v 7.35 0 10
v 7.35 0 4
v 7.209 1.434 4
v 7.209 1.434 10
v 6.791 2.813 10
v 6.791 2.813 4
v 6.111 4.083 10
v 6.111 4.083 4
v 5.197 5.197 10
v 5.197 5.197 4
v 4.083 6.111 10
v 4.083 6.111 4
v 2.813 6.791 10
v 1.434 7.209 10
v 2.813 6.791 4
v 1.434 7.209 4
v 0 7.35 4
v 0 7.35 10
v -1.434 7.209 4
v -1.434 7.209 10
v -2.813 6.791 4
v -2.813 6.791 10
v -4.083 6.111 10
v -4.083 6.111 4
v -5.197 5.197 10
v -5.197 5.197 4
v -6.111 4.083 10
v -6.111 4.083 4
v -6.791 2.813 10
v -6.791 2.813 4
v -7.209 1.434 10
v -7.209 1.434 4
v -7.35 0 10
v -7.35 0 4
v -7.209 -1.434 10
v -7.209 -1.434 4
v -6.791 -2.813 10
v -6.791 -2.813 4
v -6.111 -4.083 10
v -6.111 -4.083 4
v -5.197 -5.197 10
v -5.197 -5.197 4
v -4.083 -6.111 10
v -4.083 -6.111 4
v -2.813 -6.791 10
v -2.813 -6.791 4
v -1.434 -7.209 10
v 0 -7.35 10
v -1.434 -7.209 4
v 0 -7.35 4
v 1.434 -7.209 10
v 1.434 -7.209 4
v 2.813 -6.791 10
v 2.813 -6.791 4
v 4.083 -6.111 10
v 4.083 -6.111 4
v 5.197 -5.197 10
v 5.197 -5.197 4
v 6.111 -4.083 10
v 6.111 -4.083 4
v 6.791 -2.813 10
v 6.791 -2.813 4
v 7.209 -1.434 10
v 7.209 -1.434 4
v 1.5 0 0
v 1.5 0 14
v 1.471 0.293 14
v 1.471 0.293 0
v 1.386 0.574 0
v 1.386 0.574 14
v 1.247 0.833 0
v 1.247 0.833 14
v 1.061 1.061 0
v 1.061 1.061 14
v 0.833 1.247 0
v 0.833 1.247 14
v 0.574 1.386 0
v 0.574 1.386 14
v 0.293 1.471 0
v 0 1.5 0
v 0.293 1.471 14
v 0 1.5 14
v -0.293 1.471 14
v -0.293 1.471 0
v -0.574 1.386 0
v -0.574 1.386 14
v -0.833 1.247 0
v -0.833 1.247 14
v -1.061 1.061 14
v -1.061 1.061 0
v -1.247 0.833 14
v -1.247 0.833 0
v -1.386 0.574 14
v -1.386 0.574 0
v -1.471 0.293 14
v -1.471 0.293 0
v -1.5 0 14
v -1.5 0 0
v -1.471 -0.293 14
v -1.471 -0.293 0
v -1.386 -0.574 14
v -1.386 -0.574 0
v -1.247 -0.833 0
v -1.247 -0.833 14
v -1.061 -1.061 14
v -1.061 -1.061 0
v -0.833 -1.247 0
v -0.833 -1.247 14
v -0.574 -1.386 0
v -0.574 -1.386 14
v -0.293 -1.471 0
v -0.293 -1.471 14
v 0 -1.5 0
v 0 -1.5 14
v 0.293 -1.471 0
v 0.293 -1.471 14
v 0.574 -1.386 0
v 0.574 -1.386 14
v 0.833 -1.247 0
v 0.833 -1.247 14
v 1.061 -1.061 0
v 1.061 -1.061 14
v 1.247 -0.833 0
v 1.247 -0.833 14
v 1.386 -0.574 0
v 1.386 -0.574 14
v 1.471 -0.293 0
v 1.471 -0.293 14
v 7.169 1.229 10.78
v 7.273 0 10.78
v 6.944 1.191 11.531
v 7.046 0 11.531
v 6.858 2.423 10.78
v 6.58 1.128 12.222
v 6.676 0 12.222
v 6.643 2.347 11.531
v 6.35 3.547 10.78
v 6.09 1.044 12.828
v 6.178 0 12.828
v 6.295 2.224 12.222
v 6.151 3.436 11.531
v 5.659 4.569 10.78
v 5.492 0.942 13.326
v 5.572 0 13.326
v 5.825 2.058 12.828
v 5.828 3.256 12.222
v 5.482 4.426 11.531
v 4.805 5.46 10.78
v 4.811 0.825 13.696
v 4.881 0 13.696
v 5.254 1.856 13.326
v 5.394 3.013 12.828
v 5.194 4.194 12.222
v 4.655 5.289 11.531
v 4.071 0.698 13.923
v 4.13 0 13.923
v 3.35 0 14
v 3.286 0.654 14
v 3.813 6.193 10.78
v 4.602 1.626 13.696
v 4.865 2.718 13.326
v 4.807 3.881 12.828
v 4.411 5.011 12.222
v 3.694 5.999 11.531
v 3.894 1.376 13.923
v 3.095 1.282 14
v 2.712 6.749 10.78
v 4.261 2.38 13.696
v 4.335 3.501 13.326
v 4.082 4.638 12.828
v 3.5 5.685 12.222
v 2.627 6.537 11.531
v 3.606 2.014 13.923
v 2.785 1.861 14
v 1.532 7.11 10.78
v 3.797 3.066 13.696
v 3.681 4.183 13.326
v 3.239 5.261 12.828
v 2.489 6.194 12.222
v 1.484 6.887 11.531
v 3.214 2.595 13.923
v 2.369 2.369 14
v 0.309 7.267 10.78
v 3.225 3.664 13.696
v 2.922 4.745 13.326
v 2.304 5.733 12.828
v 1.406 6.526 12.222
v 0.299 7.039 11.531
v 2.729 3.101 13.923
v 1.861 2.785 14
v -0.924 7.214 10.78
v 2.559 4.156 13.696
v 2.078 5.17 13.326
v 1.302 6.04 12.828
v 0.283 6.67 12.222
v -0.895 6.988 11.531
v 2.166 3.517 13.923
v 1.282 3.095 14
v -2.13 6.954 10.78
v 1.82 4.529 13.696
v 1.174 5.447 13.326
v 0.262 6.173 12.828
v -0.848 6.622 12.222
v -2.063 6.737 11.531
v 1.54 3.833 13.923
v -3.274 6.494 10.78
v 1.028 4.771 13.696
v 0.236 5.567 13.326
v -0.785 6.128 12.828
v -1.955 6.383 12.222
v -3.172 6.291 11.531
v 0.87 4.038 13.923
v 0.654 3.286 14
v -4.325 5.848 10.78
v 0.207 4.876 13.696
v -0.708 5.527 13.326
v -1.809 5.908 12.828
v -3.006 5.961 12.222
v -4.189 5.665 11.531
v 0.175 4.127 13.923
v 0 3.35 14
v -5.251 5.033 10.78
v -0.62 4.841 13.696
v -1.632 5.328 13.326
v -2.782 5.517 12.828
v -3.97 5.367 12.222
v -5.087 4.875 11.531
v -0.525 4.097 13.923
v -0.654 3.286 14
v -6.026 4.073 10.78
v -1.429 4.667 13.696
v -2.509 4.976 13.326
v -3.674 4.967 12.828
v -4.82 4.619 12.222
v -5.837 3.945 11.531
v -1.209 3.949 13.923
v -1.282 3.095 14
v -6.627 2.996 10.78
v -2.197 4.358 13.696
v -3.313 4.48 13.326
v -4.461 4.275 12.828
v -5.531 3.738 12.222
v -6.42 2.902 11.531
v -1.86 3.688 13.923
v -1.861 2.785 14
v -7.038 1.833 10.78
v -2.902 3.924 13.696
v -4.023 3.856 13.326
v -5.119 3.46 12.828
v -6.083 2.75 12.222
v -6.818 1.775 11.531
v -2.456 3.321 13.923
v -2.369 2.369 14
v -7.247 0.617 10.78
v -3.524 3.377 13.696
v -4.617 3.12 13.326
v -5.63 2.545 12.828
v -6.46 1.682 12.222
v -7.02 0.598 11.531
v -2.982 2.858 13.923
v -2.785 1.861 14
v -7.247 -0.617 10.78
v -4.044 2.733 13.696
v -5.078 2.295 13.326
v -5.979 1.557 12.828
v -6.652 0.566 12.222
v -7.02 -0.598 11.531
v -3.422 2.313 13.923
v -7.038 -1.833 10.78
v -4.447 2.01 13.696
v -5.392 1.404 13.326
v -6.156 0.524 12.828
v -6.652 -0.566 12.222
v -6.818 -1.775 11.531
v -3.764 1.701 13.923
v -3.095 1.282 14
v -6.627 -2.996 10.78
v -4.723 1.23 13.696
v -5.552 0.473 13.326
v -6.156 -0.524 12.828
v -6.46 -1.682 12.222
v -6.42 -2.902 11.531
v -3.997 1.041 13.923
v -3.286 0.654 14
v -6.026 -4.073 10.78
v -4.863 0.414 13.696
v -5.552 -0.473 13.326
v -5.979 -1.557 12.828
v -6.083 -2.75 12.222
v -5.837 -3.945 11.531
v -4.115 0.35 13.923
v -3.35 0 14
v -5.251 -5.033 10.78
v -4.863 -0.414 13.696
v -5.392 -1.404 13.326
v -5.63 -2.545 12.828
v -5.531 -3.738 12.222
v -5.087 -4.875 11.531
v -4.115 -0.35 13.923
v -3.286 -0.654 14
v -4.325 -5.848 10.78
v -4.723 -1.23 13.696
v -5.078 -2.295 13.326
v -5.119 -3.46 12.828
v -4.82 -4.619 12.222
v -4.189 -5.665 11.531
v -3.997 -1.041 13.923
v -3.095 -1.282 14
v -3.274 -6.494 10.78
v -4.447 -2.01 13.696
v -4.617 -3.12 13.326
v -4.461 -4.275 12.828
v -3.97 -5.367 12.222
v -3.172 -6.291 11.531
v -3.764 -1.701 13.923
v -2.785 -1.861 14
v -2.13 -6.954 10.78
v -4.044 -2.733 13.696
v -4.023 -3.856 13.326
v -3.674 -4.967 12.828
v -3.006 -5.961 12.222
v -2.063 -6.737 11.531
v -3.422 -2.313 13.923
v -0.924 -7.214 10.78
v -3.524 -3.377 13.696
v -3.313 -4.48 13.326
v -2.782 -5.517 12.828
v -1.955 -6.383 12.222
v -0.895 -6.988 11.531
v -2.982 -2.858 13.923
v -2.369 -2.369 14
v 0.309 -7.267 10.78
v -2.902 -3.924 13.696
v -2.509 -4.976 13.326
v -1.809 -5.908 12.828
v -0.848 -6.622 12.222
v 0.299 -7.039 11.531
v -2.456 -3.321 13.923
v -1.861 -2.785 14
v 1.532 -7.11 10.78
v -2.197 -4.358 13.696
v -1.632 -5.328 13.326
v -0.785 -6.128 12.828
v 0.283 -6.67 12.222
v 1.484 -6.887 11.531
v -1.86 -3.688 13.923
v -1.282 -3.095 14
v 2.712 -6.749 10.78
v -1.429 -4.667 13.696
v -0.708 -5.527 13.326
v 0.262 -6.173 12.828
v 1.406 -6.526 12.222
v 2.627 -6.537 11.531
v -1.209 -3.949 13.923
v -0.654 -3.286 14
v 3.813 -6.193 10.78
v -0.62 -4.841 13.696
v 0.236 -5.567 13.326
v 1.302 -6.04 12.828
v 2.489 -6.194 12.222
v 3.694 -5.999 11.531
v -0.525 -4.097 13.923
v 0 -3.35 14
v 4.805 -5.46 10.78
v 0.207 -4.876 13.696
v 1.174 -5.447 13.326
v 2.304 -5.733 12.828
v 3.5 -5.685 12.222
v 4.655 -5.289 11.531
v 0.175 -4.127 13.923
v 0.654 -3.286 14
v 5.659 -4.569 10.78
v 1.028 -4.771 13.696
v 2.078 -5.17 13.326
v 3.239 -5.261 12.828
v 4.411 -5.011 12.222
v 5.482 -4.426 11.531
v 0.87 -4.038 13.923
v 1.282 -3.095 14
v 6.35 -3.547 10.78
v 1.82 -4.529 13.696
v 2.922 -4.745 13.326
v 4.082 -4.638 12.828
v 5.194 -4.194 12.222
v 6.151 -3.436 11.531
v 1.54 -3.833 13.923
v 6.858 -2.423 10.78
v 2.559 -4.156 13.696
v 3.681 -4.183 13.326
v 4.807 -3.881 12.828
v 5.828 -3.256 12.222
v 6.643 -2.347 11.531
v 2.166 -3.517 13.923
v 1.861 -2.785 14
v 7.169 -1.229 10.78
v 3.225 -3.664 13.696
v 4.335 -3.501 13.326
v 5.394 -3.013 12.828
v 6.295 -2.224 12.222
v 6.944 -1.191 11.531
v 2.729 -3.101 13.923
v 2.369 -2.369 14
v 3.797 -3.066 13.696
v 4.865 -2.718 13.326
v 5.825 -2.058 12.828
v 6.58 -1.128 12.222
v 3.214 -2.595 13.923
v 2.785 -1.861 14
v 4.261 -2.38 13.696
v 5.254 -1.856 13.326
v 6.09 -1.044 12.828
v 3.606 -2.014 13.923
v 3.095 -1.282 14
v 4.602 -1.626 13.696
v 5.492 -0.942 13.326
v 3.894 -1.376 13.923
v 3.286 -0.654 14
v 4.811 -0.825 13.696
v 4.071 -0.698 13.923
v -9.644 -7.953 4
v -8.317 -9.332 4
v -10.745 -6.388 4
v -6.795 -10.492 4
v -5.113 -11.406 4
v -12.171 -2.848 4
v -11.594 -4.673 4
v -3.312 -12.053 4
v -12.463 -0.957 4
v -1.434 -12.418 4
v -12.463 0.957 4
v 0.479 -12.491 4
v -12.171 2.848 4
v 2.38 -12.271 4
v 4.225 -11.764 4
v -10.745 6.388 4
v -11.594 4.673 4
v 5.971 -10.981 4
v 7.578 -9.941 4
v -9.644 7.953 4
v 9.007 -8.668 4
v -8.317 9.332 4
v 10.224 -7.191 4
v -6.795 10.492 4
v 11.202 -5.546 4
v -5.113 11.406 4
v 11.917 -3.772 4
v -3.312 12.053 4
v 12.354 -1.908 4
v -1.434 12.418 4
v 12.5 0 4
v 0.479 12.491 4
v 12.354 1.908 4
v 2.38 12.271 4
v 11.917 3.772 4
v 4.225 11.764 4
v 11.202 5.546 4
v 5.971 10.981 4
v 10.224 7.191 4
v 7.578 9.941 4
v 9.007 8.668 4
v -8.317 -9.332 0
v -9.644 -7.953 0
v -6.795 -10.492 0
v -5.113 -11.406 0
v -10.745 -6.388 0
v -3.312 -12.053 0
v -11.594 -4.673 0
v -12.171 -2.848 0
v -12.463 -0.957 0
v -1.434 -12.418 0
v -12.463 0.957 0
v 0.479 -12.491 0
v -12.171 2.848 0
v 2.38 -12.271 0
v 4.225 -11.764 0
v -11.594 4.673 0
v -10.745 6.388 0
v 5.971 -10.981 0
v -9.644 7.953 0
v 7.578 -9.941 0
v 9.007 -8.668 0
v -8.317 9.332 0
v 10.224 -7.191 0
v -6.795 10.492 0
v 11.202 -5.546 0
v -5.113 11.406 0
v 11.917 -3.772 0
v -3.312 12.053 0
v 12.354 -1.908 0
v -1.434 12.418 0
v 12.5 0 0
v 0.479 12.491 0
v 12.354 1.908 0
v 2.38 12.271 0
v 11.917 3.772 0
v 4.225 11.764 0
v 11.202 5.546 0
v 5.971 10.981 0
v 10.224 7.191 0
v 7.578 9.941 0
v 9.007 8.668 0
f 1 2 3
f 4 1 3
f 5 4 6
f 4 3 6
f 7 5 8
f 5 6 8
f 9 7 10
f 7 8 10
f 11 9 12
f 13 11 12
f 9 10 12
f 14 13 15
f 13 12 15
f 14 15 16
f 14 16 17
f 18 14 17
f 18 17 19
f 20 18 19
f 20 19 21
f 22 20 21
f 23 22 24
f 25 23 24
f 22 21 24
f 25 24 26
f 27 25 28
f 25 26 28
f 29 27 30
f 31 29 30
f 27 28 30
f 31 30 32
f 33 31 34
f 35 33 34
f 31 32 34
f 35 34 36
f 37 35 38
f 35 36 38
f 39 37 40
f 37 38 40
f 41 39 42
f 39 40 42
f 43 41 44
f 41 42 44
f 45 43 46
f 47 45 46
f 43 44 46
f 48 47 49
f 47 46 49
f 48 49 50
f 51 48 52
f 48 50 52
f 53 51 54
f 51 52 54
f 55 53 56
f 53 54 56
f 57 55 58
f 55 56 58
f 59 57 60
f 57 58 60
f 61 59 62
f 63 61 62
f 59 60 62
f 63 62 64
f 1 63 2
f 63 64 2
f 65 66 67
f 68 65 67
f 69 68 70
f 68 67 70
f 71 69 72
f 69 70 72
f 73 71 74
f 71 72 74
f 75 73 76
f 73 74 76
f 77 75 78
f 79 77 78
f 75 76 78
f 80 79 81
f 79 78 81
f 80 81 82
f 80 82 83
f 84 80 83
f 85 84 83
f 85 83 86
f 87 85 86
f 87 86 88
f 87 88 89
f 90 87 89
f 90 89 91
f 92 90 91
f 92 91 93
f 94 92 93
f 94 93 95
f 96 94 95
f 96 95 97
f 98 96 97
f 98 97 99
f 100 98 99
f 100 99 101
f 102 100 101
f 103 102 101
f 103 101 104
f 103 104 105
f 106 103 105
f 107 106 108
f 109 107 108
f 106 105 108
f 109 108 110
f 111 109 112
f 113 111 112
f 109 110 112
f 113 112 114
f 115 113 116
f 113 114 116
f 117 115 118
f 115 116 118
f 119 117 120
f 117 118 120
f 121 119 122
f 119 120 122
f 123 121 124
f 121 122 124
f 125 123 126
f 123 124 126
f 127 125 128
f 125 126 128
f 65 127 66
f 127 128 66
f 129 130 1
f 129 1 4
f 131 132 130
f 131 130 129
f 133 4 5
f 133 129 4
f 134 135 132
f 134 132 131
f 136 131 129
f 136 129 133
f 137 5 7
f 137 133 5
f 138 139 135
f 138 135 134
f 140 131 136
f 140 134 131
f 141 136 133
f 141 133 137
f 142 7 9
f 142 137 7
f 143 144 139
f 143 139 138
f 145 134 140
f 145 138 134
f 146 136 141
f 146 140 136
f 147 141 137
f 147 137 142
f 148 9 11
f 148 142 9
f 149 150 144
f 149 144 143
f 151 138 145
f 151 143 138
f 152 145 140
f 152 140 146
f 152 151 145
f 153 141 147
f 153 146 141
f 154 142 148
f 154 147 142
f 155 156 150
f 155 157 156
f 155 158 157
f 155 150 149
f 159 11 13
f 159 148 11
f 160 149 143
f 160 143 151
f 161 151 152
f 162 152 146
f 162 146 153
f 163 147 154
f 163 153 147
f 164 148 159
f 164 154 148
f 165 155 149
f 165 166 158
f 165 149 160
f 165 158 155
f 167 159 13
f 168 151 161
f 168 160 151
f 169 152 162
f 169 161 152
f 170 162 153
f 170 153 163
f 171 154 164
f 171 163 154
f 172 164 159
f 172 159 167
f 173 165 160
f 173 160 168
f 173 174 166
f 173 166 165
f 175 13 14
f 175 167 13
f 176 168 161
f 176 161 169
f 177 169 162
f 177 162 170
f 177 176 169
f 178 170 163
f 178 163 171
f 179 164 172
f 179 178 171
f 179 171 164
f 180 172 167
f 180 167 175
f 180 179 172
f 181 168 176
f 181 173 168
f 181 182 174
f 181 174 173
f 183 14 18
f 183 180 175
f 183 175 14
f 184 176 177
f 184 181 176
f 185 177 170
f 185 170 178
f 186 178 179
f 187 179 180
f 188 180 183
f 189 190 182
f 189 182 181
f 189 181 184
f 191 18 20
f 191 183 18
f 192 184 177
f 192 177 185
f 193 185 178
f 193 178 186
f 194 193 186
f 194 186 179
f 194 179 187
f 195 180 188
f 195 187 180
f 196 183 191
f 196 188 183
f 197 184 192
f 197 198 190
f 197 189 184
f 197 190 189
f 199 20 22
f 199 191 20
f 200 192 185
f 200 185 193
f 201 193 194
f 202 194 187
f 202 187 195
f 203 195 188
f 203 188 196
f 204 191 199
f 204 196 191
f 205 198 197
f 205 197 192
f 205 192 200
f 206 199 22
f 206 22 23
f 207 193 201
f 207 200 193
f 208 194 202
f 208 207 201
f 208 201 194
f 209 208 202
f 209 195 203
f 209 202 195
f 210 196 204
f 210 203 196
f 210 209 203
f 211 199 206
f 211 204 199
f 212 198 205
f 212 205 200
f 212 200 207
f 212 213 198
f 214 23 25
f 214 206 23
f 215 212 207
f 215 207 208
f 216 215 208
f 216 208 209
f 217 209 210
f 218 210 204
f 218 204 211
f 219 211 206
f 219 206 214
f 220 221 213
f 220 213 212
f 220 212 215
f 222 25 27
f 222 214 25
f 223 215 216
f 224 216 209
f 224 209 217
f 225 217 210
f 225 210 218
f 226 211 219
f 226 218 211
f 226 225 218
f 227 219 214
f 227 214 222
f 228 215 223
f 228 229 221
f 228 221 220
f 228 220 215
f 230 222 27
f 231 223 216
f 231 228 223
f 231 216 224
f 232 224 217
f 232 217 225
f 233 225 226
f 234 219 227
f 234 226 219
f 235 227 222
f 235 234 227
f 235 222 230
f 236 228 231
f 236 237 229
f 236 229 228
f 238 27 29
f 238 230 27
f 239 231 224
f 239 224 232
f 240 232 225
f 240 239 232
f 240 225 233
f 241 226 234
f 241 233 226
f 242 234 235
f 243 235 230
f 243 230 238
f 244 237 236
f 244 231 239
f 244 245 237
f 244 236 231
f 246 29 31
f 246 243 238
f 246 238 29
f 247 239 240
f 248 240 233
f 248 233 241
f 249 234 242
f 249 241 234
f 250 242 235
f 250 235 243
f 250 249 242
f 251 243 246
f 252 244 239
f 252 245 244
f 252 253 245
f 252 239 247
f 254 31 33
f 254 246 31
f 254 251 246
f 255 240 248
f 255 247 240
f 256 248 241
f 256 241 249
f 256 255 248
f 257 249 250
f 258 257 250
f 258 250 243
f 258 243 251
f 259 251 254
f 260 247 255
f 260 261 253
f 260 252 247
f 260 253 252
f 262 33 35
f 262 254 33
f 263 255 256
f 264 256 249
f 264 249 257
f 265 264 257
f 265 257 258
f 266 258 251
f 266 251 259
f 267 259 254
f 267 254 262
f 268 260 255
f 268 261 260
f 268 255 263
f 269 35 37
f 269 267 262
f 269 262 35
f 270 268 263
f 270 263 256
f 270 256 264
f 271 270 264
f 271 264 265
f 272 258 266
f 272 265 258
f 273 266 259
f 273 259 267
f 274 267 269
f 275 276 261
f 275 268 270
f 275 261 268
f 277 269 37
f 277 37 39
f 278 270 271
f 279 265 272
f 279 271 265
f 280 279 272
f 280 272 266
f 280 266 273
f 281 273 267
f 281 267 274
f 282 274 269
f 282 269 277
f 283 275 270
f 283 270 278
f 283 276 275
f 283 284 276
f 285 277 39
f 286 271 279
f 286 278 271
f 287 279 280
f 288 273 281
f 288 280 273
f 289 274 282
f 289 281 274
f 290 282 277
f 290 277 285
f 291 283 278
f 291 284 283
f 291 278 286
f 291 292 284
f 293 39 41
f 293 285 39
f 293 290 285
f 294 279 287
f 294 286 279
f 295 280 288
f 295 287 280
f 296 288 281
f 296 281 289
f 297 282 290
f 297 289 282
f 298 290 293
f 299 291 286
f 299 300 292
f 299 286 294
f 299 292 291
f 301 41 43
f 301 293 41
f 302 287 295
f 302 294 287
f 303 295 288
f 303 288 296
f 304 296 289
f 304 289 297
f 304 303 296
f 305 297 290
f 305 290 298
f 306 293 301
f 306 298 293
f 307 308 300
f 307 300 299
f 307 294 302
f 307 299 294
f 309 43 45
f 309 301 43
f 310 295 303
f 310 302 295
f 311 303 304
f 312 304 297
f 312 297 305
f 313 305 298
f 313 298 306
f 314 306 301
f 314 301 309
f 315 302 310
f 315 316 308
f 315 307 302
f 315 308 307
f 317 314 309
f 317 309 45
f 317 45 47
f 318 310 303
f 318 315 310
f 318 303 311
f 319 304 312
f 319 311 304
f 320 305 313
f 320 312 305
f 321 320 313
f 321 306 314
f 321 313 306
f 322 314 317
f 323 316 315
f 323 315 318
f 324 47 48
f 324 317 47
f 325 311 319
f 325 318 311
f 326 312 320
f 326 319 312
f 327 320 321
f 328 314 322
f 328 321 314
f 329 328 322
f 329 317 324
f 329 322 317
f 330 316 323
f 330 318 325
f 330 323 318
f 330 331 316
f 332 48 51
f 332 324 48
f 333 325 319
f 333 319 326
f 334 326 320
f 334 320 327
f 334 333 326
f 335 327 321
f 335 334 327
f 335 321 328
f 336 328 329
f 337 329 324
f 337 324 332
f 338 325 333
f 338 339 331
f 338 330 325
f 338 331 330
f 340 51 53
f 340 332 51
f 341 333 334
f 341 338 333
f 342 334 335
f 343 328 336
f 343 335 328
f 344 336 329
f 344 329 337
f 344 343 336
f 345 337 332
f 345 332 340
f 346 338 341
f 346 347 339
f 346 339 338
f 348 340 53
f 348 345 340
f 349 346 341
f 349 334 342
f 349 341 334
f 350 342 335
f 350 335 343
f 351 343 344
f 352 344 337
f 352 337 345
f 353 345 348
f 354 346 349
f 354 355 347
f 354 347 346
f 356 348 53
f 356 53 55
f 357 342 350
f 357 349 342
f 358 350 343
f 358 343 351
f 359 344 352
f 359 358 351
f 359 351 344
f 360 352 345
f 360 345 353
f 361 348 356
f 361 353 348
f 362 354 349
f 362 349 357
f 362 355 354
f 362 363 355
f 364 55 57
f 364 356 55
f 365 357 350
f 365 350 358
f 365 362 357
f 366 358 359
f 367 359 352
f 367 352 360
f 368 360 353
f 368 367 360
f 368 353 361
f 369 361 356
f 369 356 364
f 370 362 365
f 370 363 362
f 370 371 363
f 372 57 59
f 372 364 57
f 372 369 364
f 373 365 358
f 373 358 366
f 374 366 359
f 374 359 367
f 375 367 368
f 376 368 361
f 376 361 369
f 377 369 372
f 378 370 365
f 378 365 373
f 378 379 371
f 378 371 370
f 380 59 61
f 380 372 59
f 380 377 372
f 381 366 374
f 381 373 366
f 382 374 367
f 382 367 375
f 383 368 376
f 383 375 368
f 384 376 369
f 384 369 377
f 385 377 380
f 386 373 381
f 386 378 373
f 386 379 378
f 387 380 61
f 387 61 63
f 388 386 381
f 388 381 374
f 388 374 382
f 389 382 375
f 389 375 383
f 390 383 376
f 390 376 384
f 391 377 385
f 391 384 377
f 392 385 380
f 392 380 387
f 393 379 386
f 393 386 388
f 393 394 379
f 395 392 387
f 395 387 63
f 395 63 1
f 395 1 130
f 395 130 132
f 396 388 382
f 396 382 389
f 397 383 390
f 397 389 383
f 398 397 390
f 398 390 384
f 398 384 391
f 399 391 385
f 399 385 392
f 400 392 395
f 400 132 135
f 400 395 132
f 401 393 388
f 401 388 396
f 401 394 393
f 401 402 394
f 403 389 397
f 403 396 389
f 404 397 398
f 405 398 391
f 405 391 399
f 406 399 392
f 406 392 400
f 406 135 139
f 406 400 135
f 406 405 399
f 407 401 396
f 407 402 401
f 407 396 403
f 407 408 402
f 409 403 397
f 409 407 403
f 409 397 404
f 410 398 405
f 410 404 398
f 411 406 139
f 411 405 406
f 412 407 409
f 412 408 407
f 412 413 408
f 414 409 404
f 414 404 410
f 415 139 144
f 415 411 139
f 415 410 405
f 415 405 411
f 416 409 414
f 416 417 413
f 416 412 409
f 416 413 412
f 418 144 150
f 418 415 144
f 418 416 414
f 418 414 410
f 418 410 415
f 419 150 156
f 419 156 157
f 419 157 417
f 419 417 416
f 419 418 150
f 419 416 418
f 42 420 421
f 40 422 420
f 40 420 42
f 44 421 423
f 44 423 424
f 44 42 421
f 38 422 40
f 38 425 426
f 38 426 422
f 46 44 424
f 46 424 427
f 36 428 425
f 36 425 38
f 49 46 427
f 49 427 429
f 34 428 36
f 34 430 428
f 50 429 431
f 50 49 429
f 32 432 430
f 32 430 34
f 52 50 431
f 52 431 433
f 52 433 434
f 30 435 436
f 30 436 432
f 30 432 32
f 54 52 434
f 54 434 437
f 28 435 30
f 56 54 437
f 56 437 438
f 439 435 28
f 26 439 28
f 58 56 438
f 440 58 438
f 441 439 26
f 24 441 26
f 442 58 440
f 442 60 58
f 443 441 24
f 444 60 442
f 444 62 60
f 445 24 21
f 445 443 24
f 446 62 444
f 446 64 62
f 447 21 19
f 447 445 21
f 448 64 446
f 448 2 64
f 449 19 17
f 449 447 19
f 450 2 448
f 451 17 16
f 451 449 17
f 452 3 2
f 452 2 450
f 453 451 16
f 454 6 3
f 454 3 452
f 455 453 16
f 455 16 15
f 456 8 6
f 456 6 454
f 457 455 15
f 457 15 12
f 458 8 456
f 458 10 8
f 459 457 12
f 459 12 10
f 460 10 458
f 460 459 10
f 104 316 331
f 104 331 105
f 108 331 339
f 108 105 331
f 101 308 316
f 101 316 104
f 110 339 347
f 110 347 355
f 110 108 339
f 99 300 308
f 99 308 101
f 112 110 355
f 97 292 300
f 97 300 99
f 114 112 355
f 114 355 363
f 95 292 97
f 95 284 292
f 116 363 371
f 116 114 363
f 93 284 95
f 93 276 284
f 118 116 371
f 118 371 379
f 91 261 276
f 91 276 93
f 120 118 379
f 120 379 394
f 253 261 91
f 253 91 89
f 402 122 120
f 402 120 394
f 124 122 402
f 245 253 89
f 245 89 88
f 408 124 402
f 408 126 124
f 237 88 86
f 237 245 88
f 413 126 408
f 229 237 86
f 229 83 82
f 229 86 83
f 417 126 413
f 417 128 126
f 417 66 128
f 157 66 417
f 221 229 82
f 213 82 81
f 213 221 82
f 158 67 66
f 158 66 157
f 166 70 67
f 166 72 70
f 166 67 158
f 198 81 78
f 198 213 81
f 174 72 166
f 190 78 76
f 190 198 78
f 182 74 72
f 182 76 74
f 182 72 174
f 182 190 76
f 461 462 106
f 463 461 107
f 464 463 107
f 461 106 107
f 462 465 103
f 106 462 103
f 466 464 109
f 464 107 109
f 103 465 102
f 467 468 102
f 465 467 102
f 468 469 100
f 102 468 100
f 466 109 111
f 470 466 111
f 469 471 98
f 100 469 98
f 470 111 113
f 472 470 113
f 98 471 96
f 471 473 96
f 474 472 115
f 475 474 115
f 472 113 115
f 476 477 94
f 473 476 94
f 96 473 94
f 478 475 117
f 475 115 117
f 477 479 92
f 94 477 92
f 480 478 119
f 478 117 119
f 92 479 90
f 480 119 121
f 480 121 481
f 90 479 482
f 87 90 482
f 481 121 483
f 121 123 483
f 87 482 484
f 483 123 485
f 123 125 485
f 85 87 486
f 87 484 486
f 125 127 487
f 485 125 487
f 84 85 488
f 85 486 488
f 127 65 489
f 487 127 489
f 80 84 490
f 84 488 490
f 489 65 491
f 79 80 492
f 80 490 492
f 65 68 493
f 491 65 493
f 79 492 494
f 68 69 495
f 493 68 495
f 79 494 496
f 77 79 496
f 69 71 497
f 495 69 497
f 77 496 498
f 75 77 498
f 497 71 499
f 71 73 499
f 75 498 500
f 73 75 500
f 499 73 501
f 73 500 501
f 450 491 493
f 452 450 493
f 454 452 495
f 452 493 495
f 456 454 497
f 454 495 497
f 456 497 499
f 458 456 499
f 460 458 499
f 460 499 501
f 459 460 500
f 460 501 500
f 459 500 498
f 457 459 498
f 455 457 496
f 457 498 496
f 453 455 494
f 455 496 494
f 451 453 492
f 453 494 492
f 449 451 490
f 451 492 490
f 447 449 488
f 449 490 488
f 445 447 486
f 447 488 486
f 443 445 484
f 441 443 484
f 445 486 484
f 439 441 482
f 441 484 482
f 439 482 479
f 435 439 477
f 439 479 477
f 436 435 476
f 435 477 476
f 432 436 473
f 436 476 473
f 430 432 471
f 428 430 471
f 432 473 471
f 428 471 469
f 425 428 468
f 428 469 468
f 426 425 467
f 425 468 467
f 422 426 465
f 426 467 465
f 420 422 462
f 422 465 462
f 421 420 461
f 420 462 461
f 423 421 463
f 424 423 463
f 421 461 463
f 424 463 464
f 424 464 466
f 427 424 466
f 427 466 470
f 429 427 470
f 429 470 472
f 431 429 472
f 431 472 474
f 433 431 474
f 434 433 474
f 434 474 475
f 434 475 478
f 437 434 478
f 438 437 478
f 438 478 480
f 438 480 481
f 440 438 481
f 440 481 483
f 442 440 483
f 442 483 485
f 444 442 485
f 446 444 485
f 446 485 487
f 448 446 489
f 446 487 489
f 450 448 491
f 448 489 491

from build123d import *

# Parameters (mm, degrees)
F0_R     = 12.5
F1_DEPTH = 4
F2_R     = 7.35
F3_DEPTH = 10
F4_R     = 1.5
F5_DEPTH = 14.001
F6_R     = 4


with BuildPart() as f1:
    # F0 (on Top) → F1 (new body)
    with BuildSketch(Plane.XY):
        Circle(F0_R)
    extrude(amount=F1_DEPTH)

    # F2 (on face) → F3 (join)
    with BuildSketch(Plane.XY.offset(4)):
        Circle(F2_R)
    extrude(amount=F3_DEPTH)

    # F4 (on face) → F5 (cut, through all)
    with BuildSketch(Plane.XY.offset(14)):
        Circle(F4_R)
    extrude(amount=-F5_DEPTH, mode=Mode.SUBTRACT)

    # F6
    f6_edges = [f1.edges().sort_by_distance(p)[0] for p in [
        (-7.35, 0, 14),
    ]]
    fillet(f6_edges, radius=F6_R)


solid = f1.part
